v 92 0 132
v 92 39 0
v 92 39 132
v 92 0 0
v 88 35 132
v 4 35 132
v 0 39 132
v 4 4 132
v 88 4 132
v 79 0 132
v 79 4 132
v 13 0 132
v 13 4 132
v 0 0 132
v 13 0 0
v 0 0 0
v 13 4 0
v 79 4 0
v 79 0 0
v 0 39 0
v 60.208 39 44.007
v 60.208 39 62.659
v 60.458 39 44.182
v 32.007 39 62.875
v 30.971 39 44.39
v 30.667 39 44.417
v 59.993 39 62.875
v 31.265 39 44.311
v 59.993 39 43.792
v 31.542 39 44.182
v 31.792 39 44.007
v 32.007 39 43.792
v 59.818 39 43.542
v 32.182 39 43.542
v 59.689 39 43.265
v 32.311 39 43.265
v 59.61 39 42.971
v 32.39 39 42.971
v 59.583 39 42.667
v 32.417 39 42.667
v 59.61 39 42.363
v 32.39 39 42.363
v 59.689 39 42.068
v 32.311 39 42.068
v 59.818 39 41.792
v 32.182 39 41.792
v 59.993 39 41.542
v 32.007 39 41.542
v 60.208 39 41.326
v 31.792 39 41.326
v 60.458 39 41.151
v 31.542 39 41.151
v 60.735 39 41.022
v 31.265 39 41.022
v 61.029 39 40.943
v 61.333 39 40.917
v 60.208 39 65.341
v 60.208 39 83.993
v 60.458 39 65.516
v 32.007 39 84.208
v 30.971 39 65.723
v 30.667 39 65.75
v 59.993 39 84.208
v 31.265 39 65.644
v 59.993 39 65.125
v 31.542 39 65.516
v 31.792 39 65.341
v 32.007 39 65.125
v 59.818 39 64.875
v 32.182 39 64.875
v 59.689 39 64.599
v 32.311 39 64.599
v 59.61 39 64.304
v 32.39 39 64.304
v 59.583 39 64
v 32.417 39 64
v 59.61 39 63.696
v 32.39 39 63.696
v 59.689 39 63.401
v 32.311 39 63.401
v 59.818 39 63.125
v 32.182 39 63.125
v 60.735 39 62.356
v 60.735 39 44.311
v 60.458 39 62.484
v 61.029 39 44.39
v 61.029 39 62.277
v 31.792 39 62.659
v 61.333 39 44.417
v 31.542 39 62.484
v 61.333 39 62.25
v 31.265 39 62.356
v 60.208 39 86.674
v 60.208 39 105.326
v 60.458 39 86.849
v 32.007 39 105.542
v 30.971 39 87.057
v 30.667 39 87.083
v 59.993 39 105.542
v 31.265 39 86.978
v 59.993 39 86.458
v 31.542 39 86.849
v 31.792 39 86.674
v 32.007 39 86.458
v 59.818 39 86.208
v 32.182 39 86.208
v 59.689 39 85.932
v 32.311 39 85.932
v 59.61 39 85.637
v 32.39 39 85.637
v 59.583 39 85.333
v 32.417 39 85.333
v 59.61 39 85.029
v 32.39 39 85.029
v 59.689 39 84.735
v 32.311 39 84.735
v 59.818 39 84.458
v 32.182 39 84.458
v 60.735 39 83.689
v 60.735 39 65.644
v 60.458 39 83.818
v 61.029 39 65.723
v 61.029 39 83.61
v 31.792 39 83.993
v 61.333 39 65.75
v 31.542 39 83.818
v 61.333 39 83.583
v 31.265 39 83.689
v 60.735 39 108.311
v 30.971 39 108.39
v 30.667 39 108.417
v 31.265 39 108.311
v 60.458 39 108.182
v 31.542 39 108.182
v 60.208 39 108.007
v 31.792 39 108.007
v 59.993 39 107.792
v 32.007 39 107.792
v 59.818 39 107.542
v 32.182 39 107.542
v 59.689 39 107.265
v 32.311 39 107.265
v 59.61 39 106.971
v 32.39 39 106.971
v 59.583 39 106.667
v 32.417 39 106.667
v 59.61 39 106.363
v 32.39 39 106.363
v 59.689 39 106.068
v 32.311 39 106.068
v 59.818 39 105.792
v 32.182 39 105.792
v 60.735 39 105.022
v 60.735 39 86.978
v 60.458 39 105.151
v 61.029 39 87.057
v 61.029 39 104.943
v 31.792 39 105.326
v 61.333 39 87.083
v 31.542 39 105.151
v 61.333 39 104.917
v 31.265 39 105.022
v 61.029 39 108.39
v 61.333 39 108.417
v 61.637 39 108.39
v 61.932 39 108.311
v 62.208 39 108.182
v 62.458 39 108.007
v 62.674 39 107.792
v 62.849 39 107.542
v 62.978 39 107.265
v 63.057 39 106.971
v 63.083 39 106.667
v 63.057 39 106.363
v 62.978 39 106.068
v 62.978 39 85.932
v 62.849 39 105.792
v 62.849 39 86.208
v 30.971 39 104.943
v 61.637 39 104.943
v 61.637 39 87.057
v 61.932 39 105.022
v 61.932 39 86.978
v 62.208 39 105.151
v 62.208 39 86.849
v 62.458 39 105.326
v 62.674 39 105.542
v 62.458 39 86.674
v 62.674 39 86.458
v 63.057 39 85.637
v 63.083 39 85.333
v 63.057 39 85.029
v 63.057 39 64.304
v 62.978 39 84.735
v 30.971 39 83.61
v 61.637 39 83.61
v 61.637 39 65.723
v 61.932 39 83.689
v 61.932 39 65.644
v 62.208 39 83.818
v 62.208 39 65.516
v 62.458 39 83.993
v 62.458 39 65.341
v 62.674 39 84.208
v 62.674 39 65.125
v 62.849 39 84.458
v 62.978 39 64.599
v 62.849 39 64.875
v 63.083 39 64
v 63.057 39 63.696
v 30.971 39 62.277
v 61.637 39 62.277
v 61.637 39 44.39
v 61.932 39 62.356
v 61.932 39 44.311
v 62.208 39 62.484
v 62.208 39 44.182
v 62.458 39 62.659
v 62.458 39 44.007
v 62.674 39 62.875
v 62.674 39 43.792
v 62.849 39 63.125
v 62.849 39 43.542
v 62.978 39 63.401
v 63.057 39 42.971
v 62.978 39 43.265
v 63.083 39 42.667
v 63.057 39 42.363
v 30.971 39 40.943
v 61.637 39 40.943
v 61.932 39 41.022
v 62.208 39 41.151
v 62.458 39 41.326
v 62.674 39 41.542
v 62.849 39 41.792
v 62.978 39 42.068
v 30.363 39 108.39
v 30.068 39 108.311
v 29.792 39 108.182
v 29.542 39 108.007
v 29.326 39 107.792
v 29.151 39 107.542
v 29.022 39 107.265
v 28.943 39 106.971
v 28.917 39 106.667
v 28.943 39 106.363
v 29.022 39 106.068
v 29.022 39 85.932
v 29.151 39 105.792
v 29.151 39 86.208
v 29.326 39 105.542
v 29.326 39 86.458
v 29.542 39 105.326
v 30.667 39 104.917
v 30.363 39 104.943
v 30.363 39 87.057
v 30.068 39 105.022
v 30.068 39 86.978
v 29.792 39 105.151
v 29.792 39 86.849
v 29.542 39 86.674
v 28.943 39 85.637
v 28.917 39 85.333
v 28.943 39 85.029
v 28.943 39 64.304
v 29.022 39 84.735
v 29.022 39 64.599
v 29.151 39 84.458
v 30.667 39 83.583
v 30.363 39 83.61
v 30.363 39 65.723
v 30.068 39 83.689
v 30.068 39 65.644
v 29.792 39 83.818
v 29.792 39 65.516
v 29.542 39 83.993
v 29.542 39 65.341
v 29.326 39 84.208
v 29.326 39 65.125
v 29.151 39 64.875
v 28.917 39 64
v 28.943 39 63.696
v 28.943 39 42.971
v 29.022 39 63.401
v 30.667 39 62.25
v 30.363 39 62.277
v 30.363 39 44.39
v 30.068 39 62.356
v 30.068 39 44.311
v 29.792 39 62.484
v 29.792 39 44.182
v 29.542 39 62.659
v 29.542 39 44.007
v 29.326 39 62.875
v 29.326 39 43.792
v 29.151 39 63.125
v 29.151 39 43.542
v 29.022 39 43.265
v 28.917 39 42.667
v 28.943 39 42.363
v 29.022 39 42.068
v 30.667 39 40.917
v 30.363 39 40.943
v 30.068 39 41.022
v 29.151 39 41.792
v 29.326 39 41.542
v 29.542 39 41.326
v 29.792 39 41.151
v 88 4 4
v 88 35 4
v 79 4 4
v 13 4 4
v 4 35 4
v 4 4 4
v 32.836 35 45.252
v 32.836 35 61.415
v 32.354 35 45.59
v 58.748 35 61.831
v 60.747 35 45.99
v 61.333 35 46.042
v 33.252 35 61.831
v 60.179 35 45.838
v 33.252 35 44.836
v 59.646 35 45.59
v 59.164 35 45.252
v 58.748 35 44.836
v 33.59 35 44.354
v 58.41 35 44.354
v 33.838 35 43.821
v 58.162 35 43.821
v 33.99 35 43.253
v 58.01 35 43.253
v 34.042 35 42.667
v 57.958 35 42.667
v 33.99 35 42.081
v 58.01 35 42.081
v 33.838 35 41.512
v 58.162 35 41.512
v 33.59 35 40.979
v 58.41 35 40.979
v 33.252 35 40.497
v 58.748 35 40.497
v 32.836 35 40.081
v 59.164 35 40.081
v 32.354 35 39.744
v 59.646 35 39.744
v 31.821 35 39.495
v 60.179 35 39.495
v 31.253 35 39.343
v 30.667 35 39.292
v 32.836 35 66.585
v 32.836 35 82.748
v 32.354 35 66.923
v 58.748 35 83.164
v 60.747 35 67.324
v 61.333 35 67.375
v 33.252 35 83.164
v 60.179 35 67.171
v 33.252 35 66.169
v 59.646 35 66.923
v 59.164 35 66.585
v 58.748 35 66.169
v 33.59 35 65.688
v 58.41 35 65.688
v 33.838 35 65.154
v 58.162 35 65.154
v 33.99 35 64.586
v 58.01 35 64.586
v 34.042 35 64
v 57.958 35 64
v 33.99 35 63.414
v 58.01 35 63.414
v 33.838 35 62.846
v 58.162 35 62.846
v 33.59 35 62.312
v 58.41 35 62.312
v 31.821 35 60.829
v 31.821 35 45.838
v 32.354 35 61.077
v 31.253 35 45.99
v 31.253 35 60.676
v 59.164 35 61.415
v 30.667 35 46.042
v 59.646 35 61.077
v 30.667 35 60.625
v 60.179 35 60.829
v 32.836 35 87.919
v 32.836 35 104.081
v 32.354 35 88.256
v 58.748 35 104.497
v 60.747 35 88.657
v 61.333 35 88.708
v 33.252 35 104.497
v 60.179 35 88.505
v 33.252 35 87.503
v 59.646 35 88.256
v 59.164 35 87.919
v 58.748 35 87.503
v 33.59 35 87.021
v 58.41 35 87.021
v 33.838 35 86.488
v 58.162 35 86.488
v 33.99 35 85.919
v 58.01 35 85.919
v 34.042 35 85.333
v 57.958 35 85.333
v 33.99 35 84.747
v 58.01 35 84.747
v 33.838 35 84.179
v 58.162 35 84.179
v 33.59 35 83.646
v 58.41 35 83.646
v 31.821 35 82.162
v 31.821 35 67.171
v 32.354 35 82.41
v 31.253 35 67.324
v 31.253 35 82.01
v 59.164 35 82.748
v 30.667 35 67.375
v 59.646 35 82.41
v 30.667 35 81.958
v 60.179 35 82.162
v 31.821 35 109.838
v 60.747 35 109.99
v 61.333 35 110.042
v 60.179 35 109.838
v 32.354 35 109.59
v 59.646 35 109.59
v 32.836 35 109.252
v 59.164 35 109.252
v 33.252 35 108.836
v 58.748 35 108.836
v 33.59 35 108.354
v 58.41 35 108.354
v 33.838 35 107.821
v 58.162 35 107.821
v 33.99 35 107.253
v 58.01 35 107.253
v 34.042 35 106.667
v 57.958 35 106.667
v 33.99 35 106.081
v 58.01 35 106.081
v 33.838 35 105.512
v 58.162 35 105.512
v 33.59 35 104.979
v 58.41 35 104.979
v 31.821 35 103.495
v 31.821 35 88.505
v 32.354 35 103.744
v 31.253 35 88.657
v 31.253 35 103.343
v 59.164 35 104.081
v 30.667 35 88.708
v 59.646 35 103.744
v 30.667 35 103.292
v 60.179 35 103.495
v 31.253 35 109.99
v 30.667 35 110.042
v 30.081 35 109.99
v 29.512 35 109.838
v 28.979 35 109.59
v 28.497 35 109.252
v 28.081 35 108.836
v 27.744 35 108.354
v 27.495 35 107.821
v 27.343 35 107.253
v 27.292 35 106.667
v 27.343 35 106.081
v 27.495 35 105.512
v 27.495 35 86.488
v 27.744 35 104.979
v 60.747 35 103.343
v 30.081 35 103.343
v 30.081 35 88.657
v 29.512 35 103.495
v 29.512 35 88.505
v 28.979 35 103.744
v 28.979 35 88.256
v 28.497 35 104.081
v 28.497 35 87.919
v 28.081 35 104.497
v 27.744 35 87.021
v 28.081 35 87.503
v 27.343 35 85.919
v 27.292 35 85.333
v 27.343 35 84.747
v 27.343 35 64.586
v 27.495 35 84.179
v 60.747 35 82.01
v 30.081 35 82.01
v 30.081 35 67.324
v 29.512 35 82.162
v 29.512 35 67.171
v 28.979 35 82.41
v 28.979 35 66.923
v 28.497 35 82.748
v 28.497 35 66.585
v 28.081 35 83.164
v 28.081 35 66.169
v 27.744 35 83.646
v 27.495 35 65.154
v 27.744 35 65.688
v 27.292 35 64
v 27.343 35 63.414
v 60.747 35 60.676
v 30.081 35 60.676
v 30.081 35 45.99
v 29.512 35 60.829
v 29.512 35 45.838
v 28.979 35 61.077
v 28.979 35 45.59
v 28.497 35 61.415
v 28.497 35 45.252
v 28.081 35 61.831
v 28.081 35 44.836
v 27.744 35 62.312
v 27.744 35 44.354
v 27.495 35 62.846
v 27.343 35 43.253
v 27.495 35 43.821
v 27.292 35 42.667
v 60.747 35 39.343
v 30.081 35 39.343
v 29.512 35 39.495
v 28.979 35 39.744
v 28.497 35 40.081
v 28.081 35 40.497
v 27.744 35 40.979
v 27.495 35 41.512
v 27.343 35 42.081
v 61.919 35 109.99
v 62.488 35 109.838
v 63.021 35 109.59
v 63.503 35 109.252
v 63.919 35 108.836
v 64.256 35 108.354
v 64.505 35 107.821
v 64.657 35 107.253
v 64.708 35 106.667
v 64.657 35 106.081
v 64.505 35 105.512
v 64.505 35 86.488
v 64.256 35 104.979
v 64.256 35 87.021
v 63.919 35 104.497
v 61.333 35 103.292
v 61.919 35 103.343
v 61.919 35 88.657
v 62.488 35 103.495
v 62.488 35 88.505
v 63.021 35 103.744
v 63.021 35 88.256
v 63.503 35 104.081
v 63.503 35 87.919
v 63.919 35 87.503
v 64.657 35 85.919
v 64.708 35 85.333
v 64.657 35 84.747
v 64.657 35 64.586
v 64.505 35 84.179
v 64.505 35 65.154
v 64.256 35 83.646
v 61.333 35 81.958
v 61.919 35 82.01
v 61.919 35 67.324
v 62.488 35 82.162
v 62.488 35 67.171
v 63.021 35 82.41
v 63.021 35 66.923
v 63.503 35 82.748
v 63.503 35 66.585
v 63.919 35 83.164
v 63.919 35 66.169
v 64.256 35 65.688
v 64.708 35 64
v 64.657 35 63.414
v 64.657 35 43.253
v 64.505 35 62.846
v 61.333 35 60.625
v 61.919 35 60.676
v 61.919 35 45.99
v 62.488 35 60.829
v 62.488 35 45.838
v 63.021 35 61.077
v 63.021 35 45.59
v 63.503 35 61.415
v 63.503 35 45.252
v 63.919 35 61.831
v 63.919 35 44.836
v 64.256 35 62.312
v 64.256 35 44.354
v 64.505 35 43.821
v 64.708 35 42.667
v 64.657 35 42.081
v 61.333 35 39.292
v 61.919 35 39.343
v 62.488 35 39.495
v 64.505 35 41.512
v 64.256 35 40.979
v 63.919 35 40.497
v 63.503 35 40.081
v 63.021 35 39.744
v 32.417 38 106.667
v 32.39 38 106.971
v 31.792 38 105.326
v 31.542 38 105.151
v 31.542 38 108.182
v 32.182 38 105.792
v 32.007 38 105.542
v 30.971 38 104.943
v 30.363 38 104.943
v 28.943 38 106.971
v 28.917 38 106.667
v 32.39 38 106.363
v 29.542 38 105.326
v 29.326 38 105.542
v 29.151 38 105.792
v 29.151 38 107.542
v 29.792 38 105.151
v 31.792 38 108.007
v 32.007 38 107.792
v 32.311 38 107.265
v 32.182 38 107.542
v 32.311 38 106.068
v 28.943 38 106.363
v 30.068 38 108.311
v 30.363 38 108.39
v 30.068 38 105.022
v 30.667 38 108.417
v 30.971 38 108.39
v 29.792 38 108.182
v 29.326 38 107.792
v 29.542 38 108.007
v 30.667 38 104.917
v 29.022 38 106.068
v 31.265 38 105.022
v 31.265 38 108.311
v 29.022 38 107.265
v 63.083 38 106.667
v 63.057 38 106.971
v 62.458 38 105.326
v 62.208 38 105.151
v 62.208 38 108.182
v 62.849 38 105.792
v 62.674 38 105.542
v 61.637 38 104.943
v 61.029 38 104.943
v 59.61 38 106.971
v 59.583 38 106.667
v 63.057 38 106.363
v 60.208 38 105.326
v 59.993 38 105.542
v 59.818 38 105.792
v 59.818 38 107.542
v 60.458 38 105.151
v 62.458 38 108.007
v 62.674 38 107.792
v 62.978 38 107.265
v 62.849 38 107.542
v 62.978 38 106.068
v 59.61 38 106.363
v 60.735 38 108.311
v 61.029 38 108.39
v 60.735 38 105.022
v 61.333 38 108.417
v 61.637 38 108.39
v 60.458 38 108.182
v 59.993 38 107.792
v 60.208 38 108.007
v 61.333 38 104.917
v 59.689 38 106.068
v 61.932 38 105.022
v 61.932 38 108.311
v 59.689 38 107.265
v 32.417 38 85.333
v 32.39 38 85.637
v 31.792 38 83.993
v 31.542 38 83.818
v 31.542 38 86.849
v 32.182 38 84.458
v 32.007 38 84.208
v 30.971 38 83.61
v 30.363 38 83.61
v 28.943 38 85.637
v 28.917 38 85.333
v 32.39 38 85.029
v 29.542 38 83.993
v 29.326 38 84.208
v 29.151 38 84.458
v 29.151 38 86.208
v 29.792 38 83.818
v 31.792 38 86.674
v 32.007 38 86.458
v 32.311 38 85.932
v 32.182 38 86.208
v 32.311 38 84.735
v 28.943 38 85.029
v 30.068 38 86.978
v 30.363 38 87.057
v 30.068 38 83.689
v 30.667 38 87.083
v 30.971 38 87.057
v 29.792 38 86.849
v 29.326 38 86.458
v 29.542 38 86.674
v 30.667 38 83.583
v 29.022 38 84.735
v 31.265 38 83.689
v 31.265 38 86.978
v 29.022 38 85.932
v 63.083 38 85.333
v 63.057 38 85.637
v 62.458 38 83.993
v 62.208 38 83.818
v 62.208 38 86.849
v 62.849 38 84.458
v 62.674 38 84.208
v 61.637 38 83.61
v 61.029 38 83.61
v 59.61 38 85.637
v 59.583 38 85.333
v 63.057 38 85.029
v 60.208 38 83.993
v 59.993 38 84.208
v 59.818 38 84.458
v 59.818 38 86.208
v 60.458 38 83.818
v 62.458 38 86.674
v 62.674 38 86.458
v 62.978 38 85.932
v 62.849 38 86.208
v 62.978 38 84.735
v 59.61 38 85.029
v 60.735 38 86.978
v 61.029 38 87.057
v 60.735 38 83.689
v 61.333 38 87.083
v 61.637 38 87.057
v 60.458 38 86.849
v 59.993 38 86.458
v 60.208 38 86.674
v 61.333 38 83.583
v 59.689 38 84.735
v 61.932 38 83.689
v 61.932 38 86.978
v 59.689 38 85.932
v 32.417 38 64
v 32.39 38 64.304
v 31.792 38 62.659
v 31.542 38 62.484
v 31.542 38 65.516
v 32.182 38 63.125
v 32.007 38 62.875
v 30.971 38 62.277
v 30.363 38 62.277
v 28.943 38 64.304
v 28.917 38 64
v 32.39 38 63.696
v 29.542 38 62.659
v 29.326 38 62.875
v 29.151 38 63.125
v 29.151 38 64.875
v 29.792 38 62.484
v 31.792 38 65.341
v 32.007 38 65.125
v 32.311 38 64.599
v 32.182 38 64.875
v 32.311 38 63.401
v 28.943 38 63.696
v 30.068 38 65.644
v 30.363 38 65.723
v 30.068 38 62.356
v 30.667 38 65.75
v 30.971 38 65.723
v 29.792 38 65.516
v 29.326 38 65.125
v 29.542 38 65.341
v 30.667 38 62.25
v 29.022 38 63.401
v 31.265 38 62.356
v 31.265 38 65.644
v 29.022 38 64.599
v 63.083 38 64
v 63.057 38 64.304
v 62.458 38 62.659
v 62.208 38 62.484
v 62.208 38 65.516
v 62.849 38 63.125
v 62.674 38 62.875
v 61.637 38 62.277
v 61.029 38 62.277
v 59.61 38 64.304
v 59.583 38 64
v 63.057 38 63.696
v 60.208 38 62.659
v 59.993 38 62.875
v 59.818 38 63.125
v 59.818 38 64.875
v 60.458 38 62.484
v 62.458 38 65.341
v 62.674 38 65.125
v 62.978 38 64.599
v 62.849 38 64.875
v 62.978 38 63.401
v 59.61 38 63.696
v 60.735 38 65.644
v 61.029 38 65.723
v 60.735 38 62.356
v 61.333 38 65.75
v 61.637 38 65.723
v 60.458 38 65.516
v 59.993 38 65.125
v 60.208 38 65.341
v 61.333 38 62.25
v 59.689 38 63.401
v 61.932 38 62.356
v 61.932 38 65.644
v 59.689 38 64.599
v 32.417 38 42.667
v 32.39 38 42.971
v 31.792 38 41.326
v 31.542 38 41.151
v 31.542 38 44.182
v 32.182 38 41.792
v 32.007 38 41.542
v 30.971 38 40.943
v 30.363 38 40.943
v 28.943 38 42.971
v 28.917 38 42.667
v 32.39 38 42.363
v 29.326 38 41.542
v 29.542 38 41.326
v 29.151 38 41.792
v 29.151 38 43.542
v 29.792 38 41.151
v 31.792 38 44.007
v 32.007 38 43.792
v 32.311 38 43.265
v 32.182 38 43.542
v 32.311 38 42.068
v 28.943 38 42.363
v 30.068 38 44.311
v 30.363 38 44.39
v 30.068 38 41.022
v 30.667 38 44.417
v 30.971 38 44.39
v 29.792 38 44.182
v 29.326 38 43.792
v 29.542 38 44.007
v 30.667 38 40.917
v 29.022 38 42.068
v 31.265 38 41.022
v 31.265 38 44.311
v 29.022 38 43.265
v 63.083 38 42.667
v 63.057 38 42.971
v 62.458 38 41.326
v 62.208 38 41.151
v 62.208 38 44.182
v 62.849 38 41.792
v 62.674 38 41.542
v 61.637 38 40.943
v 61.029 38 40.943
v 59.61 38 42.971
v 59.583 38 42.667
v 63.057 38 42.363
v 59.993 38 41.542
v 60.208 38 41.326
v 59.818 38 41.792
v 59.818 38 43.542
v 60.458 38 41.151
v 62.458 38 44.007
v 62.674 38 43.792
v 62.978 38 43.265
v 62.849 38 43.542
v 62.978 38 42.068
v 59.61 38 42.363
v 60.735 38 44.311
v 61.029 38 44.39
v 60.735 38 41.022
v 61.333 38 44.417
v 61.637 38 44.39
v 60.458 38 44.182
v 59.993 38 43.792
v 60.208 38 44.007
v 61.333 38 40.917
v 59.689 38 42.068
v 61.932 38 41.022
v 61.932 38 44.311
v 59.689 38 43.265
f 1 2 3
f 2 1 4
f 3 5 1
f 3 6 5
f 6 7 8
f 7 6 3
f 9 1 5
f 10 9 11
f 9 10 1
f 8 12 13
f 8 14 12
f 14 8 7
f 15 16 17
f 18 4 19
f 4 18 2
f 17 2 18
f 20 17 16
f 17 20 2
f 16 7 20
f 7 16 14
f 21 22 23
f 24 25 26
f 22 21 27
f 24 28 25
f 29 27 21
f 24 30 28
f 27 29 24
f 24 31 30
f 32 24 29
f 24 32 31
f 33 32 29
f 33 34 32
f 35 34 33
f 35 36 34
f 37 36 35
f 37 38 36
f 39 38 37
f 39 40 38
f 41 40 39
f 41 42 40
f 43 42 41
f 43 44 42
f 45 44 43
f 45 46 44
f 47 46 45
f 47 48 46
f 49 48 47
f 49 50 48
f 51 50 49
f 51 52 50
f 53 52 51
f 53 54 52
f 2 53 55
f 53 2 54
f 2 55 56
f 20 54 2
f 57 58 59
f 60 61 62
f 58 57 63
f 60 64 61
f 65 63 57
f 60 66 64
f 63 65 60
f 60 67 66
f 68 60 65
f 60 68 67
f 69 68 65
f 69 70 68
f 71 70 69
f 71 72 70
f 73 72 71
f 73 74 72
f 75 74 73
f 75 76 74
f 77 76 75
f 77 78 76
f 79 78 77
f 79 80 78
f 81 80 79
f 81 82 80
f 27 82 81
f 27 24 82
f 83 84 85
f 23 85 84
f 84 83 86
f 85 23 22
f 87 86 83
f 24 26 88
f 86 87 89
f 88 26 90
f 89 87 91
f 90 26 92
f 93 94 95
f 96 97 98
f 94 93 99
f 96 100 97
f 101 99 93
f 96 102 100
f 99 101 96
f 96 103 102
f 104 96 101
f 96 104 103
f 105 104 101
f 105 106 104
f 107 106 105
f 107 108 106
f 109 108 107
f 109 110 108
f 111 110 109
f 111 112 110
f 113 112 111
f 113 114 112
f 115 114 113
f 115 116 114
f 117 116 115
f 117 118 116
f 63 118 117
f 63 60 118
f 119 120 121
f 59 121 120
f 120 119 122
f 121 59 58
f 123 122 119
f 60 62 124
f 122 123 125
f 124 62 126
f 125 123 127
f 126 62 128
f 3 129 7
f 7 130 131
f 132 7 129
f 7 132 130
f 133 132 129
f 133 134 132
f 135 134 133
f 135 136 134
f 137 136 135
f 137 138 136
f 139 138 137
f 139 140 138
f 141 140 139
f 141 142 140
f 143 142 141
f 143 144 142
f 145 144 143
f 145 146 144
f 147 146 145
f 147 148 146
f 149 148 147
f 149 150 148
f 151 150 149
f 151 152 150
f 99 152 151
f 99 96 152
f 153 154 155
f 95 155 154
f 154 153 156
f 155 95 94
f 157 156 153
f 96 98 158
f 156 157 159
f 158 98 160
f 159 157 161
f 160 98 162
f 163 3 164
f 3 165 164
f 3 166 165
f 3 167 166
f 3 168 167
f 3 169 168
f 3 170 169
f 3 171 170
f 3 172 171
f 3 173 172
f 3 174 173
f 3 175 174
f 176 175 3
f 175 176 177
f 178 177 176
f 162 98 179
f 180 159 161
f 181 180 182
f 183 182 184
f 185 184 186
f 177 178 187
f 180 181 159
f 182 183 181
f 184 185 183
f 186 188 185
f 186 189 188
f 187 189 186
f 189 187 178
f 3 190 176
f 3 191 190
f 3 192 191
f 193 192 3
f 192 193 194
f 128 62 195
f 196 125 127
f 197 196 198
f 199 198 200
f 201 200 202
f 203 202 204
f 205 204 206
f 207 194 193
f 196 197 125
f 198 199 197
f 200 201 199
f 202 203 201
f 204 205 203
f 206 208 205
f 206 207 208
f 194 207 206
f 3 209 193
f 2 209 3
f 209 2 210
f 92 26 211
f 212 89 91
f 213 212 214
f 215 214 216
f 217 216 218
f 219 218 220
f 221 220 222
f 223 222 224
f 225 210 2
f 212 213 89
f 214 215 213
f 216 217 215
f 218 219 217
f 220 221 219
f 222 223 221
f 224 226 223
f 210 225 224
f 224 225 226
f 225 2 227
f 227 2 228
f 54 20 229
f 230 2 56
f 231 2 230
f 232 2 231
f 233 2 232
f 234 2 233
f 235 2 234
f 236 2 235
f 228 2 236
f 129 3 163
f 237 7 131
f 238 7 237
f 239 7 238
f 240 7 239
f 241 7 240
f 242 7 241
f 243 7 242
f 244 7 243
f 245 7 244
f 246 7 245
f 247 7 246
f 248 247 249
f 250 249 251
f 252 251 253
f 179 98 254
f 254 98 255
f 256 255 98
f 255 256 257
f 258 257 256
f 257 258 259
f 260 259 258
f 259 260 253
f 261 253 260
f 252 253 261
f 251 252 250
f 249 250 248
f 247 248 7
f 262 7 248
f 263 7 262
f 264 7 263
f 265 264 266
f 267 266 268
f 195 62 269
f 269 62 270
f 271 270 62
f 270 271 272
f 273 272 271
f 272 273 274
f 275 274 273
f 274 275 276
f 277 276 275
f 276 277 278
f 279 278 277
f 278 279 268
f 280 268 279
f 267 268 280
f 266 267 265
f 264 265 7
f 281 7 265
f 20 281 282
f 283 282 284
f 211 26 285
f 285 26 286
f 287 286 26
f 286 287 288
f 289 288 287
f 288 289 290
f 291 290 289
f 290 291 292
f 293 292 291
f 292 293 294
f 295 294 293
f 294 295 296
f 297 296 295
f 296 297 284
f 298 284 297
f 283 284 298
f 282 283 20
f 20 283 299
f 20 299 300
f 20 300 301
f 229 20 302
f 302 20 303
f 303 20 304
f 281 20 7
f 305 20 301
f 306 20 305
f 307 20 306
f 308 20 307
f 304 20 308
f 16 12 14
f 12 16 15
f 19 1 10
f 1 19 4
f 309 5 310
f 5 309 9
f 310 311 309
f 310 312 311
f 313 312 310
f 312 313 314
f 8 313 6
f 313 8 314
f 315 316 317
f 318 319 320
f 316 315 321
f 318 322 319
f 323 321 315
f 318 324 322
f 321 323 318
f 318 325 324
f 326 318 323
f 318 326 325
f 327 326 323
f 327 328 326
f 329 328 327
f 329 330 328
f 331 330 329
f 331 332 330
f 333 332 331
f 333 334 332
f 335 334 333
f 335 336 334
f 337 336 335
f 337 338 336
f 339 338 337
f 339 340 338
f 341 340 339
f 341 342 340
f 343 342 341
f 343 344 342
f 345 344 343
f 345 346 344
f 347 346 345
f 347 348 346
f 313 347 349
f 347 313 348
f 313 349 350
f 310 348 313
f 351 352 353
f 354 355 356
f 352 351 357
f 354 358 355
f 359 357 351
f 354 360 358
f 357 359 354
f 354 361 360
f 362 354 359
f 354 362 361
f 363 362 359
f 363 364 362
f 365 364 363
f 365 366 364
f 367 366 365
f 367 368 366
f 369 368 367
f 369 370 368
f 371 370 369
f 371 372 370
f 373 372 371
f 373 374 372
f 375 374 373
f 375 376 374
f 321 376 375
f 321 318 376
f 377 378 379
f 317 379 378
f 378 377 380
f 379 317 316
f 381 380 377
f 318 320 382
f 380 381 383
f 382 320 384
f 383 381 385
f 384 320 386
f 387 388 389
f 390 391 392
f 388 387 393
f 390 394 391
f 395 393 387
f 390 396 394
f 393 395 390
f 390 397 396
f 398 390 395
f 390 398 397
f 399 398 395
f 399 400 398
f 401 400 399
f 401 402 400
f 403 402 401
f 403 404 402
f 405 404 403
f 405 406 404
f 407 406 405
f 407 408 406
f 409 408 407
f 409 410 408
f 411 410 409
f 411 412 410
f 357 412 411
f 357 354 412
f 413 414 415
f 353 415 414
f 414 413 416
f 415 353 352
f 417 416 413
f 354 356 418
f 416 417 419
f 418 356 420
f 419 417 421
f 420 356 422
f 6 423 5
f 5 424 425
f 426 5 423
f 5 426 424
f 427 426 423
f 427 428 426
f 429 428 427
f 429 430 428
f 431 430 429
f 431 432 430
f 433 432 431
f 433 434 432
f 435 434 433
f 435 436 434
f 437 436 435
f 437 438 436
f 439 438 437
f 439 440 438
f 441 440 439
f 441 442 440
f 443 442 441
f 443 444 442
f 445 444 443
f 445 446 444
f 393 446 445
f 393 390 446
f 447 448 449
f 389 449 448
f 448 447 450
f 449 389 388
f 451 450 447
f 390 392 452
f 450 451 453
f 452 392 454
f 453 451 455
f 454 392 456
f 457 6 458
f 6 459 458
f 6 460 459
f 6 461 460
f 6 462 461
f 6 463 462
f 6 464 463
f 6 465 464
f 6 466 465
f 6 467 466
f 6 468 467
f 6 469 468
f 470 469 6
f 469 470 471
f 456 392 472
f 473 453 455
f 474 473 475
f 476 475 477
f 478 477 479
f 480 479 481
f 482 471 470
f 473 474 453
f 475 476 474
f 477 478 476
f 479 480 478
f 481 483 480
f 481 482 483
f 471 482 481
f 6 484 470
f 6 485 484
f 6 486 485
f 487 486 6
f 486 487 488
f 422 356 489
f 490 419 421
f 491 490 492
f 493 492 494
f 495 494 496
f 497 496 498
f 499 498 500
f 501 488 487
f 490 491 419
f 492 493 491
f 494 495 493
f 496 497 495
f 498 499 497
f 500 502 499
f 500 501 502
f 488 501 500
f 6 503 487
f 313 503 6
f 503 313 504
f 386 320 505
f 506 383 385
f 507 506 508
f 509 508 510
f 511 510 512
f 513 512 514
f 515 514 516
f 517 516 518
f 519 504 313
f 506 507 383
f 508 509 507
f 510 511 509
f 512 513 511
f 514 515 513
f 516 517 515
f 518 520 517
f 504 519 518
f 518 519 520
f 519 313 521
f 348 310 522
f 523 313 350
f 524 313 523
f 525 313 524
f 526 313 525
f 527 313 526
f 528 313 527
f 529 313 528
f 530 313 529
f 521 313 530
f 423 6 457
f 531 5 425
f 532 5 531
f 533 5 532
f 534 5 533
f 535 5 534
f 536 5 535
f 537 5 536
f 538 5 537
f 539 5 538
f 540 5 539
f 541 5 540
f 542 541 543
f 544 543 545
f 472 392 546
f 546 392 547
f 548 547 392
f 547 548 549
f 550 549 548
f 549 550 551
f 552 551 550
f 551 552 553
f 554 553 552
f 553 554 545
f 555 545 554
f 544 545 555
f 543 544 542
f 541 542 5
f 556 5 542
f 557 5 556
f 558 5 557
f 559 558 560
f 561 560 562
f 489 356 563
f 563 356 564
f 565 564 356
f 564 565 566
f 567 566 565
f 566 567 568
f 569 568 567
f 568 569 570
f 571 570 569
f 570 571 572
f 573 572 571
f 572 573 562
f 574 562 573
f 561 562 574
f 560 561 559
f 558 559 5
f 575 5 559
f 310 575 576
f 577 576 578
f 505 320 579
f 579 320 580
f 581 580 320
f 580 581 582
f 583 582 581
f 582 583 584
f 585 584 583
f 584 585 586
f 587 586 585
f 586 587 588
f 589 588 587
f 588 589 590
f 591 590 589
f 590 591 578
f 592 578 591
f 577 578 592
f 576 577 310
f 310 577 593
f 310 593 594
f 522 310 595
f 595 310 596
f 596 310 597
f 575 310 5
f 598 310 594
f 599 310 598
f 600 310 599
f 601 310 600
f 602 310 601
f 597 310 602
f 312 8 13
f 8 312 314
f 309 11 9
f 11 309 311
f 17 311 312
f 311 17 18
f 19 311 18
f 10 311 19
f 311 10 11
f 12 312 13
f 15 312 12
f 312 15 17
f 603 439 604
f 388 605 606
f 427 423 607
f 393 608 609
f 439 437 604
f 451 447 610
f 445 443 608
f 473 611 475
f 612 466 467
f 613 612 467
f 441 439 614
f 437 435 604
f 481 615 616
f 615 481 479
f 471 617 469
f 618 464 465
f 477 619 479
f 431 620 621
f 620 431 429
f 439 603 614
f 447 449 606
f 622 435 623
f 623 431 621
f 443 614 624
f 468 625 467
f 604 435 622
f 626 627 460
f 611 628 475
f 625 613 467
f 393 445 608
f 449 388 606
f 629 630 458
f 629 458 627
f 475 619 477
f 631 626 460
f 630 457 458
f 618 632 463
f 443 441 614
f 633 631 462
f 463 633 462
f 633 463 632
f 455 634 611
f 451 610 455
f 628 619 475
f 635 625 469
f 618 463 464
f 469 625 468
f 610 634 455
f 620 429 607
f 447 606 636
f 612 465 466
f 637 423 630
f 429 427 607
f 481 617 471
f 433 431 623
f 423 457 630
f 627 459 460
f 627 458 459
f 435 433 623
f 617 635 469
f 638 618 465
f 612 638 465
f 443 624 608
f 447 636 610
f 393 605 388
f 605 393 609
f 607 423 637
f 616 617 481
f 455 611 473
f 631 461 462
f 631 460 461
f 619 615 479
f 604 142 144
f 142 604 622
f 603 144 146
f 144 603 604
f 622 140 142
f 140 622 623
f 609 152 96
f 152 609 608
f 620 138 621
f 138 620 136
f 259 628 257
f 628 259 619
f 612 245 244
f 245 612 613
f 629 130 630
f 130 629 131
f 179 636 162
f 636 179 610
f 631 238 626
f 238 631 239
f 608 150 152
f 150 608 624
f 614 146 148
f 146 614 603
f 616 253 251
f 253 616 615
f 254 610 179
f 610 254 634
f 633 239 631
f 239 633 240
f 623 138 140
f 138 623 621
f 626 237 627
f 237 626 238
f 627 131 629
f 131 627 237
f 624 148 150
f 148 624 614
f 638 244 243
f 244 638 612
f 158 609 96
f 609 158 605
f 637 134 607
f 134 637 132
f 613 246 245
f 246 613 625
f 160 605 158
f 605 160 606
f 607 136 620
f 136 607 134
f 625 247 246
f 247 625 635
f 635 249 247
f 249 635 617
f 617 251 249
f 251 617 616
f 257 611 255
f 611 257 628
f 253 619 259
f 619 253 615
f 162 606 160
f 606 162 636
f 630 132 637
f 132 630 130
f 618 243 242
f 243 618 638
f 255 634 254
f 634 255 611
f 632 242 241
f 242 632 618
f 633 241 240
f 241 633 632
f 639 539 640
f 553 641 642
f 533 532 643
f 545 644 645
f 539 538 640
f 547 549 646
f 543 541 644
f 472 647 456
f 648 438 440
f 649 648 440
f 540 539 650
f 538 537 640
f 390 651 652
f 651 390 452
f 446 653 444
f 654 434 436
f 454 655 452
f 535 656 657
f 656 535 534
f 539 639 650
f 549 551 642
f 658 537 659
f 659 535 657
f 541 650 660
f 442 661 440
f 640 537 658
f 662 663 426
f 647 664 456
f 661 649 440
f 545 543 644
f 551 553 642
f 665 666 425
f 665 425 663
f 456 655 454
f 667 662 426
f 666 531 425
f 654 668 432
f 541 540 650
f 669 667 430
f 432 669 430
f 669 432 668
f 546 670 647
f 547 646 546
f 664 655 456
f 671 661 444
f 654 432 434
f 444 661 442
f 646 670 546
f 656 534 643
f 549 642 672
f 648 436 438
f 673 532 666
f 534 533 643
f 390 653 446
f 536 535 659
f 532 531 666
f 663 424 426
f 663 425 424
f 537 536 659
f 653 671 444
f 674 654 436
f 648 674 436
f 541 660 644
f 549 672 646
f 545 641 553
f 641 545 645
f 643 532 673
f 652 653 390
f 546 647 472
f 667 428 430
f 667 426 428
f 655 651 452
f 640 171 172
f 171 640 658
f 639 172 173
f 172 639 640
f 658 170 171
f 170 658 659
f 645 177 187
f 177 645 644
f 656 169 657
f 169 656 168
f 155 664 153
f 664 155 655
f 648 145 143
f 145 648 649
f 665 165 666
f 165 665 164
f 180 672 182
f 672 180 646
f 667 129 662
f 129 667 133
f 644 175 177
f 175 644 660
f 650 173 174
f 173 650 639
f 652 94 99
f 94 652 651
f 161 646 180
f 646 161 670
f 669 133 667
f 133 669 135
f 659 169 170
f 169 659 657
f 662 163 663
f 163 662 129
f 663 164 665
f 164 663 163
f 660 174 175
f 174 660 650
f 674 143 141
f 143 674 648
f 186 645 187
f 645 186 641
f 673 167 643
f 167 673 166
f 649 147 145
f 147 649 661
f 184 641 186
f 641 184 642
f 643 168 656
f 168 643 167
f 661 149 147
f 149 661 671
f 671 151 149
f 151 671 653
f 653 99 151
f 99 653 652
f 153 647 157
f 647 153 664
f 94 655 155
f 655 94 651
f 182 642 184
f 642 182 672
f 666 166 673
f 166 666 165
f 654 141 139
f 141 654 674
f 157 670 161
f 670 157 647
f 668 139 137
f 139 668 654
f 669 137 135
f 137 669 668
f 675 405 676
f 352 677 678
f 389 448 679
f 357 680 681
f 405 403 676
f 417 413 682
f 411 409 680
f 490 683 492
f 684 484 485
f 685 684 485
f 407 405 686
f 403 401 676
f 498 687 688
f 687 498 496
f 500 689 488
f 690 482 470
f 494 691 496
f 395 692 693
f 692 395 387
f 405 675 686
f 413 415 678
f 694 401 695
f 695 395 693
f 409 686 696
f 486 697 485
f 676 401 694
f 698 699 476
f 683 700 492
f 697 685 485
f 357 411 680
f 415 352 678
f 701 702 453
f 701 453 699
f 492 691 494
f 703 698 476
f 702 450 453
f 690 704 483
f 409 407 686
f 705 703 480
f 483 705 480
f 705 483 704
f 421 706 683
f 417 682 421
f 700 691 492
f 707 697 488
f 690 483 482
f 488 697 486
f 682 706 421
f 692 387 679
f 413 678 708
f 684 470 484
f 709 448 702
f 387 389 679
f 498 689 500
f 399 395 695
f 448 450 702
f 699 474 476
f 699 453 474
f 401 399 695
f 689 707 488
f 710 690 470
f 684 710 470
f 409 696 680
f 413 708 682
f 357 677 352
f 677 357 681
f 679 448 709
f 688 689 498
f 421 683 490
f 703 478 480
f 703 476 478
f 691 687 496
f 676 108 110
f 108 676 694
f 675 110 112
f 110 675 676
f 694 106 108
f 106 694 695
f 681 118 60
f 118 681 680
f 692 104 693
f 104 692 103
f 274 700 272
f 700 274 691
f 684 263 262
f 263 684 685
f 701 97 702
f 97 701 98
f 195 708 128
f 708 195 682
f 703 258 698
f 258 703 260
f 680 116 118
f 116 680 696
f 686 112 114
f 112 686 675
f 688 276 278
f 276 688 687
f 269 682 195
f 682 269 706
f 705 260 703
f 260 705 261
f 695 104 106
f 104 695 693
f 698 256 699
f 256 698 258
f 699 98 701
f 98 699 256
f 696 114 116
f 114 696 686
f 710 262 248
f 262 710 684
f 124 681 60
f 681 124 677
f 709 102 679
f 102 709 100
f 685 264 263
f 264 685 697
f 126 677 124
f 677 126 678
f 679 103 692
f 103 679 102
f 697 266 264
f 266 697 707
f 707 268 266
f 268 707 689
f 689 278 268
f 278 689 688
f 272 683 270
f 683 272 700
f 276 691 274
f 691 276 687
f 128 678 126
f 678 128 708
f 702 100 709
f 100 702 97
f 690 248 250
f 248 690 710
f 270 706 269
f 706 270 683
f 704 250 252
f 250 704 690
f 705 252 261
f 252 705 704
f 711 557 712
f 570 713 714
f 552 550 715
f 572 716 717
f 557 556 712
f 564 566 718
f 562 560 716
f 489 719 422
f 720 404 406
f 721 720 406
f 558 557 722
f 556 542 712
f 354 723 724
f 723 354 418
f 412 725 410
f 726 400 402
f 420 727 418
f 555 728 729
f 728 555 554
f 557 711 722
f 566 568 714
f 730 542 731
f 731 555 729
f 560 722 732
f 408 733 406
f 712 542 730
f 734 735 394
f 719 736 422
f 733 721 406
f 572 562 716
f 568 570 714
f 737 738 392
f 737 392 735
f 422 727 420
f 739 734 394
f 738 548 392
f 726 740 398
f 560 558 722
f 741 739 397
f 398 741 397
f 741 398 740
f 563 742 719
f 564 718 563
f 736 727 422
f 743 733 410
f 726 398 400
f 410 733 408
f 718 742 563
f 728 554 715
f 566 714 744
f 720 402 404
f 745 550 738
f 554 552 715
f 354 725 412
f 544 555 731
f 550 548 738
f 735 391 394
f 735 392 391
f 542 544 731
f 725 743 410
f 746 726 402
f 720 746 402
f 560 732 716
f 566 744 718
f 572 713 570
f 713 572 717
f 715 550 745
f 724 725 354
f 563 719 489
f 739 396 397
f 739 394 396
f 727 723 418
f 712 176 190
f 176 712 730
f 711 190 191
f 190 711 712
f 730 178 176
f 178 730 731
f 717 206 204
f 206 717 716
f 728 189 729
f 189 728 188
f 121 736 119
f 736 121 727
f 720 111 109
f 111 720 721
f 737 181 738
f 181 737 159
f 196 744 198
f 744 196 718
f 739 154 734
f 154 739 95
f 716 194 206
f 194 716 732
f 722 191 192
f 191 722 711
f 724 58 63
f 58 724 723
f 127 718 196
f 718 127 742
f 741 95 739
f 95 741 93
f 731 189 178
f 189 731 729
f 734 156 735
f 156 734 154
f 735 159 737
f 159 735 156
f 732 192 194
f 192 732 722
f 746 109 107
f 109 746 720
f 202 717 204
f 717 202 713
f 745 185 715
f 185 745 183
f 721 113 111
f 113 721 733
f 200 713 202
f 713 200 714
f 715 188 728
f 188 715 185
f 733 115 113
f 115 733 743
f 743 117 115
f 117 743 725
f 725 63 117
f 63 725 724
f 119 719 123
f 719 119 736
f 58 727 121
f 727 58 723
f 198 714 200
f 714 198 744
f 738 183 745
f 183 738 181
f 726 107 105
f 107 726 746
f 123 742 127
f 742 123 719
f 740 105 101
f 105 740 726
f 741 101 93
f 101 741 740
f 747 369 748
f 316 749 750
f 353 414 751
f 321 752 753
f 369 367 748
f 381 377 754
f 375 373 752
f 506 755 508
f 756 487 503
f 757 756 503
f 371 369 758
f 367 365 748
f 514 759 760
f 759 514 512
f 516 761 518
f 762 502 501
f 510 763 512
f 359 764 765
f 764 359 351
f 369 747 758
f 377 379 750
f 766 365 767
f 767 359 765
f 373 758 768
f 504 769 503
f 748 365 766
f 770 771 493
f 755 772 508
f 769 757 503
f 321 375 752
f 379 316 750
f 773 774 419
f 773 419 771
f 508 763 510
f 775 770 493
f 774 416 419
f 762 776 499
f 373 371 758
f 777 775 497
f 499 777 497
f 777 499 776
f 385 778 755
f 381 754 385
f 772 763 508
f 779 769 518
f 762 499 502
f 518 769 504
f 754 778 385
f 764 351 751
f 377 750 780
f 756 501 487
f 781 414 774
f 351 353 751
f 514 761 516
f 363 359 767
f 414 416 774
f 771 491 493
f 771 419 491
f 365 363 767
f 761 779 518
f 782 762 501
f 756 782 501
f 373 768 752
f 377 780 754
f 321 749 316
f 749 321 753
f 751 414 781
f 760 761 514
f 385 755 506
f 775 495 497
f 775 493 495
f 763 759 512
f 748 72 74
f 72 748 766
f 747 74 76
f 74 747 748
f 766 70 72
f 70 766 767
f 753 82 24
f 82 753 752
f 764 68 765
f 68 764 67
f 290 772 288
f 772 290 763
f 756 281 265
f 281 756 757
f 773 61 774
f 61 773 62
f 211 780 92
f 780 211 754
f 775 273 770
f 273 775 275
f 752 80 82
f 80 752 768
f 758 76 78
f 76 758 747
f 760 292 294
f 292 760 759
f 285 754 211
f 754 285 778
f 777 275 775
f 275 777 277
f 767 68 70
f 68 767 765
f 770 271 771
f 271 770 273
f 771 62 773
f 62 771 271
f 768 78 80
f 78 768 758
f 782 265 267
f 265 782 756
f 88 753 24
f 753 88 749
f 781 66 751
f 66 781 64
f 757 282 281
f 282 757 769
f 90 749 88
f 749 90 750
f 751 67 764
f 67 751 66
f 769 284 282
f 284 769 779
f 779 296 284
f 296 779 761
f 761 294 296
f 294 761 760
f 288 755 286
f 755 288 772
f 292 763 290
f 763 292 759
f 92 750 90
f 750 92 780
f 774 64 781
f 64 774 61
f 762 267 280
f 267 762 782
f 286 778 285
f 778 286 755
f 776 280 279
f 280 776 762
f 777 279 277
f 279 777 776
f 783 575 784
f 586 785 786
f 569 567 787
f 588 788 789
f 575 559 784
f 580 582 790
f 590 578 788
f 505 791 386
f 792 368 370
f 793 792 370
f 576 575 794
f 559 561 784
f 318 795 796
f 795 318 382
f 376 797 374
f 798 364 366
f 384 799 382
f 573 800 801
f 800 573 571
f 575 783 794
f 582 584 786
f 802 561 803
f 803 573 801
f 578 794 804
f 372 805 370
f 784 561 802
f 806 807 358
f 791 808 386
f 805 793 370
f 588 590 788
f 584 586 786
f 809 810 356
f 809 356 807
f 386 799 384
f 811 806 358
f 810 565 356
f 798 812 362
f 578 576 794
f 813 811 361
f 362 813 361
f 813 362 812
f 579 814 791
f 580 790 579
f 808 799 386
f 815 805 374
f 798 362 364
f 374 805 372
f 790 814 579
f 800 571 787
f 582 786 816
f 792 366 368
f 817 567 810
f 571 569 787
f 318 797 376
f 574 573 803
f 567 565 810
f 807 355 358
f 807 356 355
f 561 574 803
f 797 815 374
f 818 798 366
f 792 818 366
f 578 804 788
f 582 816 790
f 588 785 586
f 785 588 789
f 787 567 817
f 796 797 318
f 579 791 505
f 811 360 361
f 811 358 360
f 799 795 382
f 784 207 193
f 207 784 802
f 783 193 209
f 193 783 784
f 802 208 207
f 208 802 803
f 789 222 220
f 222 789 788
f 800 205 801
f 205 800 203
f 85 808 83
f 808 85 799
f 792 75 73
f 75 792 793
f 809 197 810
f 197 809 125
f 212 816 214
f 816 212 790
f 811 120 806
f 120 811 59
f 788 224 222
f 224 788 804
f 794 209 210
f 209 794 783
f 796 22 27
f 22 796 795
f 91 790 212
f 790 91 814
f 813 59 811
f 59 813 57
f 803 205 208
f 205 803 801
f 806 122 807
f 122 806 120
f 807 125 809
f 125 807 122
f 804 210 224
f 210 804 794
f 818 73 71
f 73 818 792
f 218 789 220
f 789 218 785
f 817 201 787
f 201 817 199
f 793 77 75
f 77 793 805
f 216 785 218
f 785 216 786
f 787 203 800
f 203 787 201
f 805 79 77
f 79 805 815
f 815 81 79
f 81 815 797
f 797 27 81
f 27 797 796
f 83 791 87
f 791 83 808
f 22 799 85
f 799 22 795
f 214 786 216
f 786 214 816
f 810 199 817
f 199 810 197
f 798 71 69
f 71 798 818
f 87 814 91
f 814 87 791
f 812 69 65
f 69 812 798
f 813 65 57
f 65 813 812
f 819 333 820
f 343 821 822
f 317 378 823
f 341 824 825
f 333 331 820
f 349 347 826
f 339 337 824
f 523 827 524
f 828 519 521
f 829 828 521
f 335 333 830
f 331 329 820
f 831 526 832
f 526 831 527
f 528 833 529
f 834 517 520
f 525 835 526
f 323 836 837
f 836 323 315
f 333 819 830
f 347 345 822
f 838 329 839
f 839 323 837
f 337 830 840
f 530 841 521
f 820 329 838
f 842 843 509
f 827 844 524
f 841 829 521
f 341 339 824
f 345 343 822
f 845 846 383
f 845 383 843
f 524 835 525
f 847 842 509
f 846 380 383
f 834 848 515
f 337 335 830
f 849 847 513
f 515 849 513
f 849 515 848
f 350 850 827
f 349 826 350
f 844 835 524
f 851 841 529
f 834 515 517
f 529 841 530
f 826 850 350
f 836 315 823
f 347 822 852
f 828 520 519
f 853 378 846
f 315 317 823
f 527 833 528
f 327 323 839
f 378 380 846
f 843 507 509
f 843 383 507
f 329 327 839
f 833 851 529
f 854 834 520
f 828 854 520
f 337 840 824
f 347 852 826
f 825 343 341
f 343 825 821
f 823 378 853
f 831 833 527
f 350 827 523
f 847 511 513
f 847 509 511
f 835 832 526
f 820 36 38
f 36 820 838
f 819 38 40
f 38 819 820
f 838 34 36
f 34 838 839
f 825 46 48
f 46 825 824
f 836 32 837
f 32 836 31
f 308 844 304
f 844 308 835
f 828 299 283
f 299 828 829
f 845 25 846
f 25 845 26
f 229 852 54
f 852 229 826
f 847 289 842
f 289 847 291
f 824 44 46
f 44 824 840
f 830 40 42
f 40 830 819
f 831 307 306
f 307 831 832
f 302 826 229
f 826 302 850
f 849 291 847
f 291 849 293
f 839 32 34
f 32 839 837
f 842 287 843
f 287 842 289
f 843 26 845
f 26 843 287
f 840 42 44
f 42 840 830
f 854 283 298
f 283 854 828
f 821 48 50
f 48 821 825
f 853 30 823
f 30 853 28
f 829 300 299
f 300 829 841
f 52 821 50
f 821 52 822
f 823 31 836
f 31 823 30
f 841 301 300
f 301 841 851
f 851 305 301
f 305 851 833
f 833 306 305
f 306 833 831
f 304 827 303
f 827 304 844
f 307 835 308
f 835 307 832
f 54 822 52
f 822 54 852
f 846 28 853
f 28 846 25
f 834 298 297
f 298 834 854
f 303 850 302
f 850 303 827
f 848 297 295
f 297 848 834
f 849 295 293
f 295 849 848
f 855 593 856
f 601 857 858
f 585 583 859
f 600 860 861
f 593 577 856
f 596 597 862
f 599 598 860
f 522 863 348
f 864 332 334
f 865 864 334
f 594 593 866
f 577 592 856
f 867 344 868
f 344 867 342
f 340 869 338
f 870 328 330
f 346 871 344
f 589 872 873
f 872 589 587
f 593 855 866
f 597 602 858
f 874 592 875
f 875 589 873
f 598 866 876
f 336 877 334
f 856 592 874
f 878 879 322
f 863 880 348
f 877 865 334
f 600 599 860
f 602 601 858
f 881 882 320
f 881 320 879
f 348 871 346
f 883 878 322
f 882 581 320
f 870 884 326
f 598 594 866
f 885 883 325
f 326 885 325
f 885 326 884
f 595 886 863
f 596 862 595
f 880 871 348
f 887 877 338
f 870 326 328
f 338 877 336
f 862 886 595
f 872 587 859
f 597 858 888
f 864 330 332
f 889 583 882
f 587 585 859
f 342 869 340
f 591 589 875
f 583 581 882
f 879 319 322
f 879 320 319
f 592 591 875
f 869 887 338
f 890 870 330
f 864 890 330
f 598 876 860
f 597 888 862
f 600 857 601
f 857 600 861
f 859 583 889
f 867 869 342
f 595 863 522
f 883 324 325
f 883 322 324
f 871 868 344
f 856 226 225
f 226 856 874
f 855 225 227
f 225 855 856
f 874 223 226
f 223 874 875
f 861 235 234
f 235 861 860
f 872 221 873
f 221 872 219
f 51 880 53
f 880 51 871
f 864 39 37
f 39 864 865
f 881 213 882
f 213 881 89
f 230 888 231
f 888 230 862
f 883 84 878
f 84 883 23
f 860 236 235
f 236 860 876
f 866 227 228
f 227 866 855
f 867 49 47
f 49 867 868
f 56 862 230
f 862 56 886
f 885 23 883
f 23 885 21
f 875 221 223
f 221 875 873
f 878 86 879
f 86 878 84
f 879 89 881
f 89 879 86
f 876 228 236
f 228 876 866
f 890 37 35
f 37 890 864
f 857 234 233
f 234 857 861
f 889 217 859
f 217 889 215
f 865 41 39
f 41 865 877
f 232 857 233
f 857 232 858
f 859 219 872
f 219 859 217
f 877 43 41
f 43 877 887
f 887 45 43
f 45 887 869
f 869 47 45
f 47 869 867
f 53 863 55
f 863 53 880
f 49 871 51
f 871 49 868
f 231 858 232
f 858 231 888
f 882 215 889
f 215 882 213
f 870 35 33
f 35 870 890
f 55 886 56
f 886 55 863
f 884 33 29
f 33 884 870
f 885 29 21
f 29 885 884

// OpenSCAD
$fn=36;
innerwidth = 84;
innerdepth = 31;
frontwallwitdh=13;
height=128;
t=4;
outerwidth=innerwidth+t+t;

module mainunitholder()
{
    difference()
    {
        cube([outerwidth, innerdepth+t+t, height+t]);   
        
        translate([t,t,t])
        cube([innerwidth, innerdepth, height]);
        
        translate([frontwallwitdh,0,0])
        cube([outerwidth-frontwallwitdh*2, t, height+t]);
    }
}

difference()
{
    mainunitholder();
    
    translate([0,innerdepth+t,0])
    {
        translate([outerwidth/3,0,height/6*5])
        schraube();
        
        translate([outerwidth/3*2,0,height/6*5])
        schraube();
        
        translate([outerwidth/3,0,height/6*4])
        schraube();
        
        translate([outerwidth/3*2,0,height/6*4])
        schraube();
        
        translate([outerwidth/3,0,height/6*3])
        schraube();
        
        translate([outerwidth/3*2,0,height/6*3])
        schraube();
        
        translate([outerwidth/3,0,height/6*2])
        schraube();
        
        translate([outerwidth/3*2,0,height/6*2])
        schraube();
    }
}

//Höhe Schraubenkopf
hst=16.5;
hsk=3;
//Durchmesser Schraubenkopf
dsk=6.75;
//Durchmesser Schraube
ds=3.5;
//Höhe Schrauben(gewinde)
hs=hst-hsk;

module schraube()
{
    translate([0,hsk,0])
    rotate([90,0,0])
    {
        cylinder(h=hsk,d1=ds, d2=dsk);
        translate([0,0,-hs])
        cylinder(h=hs,d=ds);
    }
}
